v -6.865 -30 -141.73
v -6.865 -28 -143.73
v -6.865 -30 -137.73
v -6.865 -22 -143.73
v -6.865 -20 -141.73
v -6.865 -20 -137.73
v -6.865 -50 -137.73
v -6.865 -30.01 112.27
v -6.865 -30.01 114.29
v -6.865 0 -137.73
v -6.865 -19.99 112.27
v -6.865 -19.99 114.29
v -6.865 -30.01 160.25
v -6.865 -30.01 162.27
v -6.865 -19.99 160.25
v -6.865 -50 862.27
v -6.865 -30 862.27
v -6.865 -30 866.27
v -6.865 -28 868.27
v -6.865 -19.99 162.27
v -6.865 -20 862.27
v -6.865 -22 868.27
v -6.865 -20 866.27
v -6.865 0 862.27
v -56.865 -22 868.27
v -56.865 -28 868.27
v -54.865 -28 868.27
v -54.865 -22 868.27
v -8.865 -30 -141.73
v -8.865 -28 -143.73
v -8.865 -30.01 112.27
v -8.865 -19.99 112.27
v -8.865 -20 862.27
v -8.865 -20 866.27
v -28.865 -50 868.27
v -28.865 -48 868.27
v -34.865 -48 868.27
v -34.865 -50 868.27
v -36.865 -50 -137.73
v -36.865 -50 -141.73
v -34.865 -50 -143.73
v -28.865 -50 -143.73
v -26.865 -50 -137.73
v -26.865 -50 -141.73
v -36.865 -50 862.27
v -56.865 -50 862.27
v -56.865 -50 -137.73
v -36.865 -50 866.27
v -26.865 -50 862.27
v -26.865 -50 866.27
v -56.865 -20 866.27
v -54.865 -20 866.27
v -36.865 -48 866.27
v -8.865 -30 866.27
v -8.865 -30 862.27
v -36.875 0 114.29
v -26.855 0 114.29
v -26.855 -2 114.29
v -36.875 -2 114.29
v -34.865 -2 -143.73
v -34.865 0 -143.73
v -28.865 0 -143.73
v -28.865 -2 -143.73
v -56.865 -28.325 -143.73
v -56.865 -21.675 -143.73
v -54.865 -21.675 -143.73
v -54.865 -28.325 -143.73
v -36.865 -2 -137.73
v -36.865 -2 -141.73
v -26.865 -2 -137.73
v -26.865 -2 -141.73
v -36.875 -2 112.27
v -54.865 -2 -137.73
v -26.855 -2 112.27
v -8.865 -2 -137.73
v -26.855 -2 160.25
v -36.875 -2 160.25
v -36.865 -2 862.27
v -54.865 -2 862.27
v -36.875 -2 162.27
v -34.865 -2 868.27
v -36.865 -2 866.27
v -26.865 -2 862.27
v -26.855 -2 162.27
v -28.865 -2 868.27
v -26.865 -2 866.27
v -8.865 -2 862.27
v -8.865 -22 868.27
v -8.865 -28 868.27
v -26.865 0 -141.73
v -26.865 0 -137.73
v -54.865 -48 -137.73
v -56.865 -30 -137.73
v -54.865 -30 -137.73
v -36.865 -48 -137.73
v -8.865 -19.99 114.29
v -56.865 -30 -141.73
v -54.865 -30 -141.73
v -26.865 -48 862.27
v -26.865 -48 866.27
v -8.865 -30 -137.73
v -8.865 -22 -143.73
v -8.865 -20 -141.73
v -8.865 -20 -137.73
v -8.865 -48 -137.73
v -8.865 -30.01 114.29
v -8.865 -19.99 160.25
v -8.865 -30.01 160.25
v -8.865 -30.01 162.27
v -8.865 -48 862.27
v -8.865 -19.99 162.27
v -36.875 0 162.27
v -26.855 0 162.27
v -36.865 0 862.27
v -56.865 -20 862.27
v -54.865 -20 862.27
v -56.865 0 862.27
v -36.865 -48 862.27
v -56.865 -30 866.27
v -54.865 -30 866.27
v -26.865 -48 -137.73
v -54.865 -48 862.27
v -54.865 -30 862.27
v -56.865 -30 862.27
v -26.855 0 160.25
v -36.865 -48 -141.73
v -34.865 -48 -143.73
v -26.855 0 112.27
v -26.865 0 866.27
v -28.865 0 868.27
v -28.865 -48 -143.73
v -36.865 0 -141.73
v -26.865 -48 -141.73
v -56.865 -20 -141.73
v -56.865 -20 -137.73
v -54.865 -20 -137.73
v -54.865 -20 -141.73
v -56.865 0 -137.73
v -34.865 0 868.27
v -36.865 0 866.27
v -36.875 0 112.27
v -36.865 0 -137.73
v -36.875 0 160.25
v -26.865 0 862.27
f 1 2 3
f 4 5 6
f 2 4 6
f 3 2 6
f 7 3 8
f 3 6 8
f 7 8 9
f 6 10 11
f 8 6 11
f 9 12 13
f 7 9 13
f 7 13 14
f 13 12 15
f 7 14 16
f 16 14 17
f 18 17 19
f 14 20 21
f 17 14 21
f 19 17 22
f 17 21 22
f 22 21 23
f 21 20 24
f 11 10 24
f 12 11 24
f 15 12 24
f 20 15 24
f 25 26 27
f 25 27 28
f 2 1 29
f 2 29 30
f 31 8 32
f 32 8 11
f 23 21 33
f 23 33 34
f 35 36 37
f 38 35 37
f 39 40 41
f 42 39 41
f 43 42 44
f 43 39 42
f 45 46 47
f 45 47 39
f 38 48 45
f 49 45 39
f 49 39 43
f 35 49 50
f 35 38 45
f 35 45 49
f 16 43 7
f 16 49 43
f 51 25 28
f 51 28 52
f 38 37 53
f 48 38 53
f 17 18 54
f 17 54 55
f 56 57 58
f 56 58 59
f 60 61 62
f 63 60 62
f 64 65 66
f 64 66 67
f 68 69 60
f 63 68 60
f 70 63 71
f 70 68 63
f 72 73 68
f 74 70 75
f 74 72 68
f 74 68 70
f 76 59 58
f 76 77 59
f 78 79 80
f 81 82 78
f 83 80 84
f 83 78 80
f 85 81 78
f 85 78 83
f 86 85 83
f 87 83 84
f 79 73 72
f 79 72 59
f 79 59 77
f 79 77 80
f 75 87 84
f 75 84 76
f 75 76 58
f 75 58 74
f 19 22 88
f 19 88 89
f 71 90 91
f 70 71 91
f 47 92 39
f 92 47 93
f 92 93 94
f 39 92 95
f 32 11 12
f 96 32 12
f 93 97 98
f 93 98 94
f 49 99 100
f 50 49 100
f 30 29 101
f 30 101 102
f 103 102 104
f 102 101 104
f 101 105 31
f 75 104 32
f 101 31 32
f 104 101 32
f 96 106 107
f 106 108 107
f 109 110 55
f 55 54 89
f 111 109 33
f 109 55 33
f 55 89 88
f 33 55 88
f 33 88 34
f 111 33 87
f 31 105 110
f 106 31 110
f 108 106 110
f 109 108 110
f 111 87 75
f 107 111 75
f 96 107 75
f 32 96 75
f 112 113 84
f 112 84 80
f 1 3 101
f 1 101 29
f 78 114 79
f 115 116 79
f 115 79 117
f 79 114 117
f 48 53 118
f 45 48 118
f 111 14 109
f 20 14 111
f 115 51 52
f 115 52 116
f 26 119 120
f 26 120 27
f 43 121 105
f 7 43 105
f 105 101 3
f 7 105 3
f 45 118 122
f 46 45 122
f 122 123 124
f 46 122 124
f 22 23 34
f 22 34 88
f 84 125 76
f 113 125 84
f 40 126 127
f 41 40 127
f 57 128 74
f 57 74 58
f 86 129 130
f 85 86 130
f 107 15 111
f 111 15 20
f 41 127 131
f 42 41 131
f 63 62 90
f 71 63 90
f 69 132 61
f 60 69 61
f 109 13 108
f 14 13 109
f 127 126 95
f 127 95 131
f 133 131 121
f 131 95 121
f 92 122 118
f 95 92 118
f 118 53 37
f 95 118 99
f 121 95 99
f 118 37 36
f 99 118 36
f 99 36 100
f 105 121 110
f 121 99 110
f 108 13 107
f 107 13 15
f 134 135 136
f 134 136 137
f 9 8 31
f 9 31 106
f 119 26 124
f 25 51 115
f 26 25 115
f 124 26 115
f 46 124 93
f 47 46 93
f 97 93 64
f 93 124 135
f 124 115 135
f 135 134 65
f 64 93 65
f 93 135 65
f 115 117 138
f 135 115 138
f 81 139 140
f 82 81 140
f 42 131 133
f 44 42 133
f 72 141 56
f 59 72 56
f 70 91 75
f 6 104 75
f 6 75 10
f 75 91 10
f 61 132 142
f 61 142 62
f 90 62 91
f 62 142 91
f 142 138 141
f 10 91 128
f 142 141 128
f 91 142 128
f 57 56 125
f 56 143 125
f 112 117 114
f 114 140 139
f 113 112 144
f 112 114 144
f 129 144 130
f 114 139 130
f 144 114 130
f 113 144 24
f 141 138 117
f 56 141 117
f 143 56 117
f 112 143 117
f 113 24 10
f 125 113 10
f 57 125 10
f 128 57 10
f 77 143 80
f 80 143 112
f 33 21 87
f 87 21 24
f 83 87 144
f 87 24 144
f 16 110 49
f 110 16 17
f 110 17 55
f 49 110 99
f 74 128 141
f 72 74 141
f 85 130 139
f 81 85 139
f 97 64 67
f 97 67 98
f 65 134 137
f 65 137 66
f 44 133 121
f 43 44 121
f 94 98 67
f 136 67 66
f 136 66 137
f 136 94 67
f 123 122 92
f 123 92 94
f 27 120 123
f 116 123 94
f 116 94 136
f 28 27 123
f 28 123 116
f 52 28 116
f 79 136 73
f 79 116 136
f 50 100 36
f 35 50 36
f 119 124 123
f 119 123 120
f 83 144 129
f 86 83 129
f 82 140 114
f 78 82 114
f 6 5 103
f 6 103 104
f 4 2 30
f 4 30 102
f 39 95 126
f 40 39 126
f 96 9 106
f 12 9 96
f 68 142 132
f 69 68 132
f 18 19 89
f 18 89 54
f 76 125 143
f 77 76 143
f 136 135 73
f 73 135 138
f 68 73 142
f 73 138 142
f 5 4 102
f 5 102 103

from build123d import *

# Parameters (mm, degrees)
F1_DEPTH  = 50
F2_W      = 46
F2_H      = 46
F4_DEPTH  = 1012.001
F5_DEPTH  = 2
F7_DEPTH  = 2
F9_DEPTH  = 2
F11_DEPTH = 2
F12_W     = 10.02
F12_H     = 2.02
F13_DEPTH = 2
F14_W     = 10.02
F14_H     = 2.02
F15_DEPTH = 2


with BuildPart() as f1:
    # F0 (on Front) → F1 (new body)
    with BuildSketch(Plane.XZ):
        Polygon((-36.864701, 862.26987), (-56.864701, 862.26987), (-56.864701, -137.73013), (-36.864701, -137.73013), (-36.864701, -141.73013), (-34.864701, -143.73013), (-28.864701, -143.73013), (-26.864701, -141.73013), (-26.864701, -137.73013), (-6.864701, -137.73013), (-6.864701, 862.26987), (-26.864701, 862.26987), (-26.864701, 866.26987), (-28.864701, 868.26987), (-34.864701, 868.26987), (-36.864701, 866.26987), align=None)
    extrude(amount=F1_DEPTH)

    # F2 (on face) → F4 (cut, through all)
    with BuildSketch(Plane.XY.offset(868.26987)):
        with Locations((-31.864701, -25)):
            Rectangle(F2_W, F2_H)
    extrude(amount=-F4_DEPTH, mode=Mode.SUBTRACT)

    # F3 (on face) → F5 (join)
    with BuildSketch(Plane.YZ.offset(-6.864701)):
        Polygon((-30, 866.26987), (-30, 862.26987), (-20, 862.26987), (-20, 866.26987), (-22, 868.26987), (-28, 868.26987), align=None)
    extrude(amount=-F5_DEPTH)

    # F6 (on face) → F7 (join)
    with BuildSketch(Plane(origin=(-56.864701, 0, 0), x_dir=(0, -1, 0), z_dir=(-1, 0, 0))):
        Polygon((20, 866.26987), (20, 862.26987), (30, 862.26987), (30, 866.26987), (28, 868.26987), (22, 868.26987), align=None)
    extrude(amount=-F7_DEPTH)

    # F8 (on face) → F9 (join)
    with BuildSketch(Plane(origin=(-56.864701, 0, 0), x_dir=(0, -1, 0), z_dir=(-1, 0, 0))):
        Polygon((30, -137.73013), (20, -137.73013), (20, -141.73013), (21.675467, -143.73013), (28.324533, -143.73013), (30, -141.73013), align=None)
    extrude(amount=-F9_DEPTH)

    # F10 (on face) → F11 (join)
    with BuildSketch(Plane.YZ.offset(-6.864701)):
        Polygon((-20, -137.73013), (-30, -137.73013), (-30, -141.73013), (-28, -143.73013), (-22, -143.73013), (-20, -141.73013), align=None)
    extrude(amount=-F11_DEPTH)

    # F12 (on face) → F13 (cut)
    with BuildSketch(Plane.YZ.offset(-6.864701)):
        with Locations((-25, 161.25987)):
            Rectangle(F12_W, F12_H)
        with Locations((-25, 113.27987)):
            Rectangle(F12_W, F12_H)
    extrude(amount=-F13_DEPTH, mode=Mode.SUBTRACT)

    # F14 (on face) → F15 (cut)
    with BuildSketch(Plane(origin=(0, 0, 0), x_dir=(-1, 0, 0), z_dir=(0, 1, 0))):
        with Locations((31.864701, 161.25987)):
            Rectangle(F14_W, F14_H)
        with Locations((31.864701, 113.27987)):
            Rectangle(F14_W, F14_H)
    extrude(amount=-F15_DEPTH, mode=Mode.SUBTRACT)


solid = f1.part
